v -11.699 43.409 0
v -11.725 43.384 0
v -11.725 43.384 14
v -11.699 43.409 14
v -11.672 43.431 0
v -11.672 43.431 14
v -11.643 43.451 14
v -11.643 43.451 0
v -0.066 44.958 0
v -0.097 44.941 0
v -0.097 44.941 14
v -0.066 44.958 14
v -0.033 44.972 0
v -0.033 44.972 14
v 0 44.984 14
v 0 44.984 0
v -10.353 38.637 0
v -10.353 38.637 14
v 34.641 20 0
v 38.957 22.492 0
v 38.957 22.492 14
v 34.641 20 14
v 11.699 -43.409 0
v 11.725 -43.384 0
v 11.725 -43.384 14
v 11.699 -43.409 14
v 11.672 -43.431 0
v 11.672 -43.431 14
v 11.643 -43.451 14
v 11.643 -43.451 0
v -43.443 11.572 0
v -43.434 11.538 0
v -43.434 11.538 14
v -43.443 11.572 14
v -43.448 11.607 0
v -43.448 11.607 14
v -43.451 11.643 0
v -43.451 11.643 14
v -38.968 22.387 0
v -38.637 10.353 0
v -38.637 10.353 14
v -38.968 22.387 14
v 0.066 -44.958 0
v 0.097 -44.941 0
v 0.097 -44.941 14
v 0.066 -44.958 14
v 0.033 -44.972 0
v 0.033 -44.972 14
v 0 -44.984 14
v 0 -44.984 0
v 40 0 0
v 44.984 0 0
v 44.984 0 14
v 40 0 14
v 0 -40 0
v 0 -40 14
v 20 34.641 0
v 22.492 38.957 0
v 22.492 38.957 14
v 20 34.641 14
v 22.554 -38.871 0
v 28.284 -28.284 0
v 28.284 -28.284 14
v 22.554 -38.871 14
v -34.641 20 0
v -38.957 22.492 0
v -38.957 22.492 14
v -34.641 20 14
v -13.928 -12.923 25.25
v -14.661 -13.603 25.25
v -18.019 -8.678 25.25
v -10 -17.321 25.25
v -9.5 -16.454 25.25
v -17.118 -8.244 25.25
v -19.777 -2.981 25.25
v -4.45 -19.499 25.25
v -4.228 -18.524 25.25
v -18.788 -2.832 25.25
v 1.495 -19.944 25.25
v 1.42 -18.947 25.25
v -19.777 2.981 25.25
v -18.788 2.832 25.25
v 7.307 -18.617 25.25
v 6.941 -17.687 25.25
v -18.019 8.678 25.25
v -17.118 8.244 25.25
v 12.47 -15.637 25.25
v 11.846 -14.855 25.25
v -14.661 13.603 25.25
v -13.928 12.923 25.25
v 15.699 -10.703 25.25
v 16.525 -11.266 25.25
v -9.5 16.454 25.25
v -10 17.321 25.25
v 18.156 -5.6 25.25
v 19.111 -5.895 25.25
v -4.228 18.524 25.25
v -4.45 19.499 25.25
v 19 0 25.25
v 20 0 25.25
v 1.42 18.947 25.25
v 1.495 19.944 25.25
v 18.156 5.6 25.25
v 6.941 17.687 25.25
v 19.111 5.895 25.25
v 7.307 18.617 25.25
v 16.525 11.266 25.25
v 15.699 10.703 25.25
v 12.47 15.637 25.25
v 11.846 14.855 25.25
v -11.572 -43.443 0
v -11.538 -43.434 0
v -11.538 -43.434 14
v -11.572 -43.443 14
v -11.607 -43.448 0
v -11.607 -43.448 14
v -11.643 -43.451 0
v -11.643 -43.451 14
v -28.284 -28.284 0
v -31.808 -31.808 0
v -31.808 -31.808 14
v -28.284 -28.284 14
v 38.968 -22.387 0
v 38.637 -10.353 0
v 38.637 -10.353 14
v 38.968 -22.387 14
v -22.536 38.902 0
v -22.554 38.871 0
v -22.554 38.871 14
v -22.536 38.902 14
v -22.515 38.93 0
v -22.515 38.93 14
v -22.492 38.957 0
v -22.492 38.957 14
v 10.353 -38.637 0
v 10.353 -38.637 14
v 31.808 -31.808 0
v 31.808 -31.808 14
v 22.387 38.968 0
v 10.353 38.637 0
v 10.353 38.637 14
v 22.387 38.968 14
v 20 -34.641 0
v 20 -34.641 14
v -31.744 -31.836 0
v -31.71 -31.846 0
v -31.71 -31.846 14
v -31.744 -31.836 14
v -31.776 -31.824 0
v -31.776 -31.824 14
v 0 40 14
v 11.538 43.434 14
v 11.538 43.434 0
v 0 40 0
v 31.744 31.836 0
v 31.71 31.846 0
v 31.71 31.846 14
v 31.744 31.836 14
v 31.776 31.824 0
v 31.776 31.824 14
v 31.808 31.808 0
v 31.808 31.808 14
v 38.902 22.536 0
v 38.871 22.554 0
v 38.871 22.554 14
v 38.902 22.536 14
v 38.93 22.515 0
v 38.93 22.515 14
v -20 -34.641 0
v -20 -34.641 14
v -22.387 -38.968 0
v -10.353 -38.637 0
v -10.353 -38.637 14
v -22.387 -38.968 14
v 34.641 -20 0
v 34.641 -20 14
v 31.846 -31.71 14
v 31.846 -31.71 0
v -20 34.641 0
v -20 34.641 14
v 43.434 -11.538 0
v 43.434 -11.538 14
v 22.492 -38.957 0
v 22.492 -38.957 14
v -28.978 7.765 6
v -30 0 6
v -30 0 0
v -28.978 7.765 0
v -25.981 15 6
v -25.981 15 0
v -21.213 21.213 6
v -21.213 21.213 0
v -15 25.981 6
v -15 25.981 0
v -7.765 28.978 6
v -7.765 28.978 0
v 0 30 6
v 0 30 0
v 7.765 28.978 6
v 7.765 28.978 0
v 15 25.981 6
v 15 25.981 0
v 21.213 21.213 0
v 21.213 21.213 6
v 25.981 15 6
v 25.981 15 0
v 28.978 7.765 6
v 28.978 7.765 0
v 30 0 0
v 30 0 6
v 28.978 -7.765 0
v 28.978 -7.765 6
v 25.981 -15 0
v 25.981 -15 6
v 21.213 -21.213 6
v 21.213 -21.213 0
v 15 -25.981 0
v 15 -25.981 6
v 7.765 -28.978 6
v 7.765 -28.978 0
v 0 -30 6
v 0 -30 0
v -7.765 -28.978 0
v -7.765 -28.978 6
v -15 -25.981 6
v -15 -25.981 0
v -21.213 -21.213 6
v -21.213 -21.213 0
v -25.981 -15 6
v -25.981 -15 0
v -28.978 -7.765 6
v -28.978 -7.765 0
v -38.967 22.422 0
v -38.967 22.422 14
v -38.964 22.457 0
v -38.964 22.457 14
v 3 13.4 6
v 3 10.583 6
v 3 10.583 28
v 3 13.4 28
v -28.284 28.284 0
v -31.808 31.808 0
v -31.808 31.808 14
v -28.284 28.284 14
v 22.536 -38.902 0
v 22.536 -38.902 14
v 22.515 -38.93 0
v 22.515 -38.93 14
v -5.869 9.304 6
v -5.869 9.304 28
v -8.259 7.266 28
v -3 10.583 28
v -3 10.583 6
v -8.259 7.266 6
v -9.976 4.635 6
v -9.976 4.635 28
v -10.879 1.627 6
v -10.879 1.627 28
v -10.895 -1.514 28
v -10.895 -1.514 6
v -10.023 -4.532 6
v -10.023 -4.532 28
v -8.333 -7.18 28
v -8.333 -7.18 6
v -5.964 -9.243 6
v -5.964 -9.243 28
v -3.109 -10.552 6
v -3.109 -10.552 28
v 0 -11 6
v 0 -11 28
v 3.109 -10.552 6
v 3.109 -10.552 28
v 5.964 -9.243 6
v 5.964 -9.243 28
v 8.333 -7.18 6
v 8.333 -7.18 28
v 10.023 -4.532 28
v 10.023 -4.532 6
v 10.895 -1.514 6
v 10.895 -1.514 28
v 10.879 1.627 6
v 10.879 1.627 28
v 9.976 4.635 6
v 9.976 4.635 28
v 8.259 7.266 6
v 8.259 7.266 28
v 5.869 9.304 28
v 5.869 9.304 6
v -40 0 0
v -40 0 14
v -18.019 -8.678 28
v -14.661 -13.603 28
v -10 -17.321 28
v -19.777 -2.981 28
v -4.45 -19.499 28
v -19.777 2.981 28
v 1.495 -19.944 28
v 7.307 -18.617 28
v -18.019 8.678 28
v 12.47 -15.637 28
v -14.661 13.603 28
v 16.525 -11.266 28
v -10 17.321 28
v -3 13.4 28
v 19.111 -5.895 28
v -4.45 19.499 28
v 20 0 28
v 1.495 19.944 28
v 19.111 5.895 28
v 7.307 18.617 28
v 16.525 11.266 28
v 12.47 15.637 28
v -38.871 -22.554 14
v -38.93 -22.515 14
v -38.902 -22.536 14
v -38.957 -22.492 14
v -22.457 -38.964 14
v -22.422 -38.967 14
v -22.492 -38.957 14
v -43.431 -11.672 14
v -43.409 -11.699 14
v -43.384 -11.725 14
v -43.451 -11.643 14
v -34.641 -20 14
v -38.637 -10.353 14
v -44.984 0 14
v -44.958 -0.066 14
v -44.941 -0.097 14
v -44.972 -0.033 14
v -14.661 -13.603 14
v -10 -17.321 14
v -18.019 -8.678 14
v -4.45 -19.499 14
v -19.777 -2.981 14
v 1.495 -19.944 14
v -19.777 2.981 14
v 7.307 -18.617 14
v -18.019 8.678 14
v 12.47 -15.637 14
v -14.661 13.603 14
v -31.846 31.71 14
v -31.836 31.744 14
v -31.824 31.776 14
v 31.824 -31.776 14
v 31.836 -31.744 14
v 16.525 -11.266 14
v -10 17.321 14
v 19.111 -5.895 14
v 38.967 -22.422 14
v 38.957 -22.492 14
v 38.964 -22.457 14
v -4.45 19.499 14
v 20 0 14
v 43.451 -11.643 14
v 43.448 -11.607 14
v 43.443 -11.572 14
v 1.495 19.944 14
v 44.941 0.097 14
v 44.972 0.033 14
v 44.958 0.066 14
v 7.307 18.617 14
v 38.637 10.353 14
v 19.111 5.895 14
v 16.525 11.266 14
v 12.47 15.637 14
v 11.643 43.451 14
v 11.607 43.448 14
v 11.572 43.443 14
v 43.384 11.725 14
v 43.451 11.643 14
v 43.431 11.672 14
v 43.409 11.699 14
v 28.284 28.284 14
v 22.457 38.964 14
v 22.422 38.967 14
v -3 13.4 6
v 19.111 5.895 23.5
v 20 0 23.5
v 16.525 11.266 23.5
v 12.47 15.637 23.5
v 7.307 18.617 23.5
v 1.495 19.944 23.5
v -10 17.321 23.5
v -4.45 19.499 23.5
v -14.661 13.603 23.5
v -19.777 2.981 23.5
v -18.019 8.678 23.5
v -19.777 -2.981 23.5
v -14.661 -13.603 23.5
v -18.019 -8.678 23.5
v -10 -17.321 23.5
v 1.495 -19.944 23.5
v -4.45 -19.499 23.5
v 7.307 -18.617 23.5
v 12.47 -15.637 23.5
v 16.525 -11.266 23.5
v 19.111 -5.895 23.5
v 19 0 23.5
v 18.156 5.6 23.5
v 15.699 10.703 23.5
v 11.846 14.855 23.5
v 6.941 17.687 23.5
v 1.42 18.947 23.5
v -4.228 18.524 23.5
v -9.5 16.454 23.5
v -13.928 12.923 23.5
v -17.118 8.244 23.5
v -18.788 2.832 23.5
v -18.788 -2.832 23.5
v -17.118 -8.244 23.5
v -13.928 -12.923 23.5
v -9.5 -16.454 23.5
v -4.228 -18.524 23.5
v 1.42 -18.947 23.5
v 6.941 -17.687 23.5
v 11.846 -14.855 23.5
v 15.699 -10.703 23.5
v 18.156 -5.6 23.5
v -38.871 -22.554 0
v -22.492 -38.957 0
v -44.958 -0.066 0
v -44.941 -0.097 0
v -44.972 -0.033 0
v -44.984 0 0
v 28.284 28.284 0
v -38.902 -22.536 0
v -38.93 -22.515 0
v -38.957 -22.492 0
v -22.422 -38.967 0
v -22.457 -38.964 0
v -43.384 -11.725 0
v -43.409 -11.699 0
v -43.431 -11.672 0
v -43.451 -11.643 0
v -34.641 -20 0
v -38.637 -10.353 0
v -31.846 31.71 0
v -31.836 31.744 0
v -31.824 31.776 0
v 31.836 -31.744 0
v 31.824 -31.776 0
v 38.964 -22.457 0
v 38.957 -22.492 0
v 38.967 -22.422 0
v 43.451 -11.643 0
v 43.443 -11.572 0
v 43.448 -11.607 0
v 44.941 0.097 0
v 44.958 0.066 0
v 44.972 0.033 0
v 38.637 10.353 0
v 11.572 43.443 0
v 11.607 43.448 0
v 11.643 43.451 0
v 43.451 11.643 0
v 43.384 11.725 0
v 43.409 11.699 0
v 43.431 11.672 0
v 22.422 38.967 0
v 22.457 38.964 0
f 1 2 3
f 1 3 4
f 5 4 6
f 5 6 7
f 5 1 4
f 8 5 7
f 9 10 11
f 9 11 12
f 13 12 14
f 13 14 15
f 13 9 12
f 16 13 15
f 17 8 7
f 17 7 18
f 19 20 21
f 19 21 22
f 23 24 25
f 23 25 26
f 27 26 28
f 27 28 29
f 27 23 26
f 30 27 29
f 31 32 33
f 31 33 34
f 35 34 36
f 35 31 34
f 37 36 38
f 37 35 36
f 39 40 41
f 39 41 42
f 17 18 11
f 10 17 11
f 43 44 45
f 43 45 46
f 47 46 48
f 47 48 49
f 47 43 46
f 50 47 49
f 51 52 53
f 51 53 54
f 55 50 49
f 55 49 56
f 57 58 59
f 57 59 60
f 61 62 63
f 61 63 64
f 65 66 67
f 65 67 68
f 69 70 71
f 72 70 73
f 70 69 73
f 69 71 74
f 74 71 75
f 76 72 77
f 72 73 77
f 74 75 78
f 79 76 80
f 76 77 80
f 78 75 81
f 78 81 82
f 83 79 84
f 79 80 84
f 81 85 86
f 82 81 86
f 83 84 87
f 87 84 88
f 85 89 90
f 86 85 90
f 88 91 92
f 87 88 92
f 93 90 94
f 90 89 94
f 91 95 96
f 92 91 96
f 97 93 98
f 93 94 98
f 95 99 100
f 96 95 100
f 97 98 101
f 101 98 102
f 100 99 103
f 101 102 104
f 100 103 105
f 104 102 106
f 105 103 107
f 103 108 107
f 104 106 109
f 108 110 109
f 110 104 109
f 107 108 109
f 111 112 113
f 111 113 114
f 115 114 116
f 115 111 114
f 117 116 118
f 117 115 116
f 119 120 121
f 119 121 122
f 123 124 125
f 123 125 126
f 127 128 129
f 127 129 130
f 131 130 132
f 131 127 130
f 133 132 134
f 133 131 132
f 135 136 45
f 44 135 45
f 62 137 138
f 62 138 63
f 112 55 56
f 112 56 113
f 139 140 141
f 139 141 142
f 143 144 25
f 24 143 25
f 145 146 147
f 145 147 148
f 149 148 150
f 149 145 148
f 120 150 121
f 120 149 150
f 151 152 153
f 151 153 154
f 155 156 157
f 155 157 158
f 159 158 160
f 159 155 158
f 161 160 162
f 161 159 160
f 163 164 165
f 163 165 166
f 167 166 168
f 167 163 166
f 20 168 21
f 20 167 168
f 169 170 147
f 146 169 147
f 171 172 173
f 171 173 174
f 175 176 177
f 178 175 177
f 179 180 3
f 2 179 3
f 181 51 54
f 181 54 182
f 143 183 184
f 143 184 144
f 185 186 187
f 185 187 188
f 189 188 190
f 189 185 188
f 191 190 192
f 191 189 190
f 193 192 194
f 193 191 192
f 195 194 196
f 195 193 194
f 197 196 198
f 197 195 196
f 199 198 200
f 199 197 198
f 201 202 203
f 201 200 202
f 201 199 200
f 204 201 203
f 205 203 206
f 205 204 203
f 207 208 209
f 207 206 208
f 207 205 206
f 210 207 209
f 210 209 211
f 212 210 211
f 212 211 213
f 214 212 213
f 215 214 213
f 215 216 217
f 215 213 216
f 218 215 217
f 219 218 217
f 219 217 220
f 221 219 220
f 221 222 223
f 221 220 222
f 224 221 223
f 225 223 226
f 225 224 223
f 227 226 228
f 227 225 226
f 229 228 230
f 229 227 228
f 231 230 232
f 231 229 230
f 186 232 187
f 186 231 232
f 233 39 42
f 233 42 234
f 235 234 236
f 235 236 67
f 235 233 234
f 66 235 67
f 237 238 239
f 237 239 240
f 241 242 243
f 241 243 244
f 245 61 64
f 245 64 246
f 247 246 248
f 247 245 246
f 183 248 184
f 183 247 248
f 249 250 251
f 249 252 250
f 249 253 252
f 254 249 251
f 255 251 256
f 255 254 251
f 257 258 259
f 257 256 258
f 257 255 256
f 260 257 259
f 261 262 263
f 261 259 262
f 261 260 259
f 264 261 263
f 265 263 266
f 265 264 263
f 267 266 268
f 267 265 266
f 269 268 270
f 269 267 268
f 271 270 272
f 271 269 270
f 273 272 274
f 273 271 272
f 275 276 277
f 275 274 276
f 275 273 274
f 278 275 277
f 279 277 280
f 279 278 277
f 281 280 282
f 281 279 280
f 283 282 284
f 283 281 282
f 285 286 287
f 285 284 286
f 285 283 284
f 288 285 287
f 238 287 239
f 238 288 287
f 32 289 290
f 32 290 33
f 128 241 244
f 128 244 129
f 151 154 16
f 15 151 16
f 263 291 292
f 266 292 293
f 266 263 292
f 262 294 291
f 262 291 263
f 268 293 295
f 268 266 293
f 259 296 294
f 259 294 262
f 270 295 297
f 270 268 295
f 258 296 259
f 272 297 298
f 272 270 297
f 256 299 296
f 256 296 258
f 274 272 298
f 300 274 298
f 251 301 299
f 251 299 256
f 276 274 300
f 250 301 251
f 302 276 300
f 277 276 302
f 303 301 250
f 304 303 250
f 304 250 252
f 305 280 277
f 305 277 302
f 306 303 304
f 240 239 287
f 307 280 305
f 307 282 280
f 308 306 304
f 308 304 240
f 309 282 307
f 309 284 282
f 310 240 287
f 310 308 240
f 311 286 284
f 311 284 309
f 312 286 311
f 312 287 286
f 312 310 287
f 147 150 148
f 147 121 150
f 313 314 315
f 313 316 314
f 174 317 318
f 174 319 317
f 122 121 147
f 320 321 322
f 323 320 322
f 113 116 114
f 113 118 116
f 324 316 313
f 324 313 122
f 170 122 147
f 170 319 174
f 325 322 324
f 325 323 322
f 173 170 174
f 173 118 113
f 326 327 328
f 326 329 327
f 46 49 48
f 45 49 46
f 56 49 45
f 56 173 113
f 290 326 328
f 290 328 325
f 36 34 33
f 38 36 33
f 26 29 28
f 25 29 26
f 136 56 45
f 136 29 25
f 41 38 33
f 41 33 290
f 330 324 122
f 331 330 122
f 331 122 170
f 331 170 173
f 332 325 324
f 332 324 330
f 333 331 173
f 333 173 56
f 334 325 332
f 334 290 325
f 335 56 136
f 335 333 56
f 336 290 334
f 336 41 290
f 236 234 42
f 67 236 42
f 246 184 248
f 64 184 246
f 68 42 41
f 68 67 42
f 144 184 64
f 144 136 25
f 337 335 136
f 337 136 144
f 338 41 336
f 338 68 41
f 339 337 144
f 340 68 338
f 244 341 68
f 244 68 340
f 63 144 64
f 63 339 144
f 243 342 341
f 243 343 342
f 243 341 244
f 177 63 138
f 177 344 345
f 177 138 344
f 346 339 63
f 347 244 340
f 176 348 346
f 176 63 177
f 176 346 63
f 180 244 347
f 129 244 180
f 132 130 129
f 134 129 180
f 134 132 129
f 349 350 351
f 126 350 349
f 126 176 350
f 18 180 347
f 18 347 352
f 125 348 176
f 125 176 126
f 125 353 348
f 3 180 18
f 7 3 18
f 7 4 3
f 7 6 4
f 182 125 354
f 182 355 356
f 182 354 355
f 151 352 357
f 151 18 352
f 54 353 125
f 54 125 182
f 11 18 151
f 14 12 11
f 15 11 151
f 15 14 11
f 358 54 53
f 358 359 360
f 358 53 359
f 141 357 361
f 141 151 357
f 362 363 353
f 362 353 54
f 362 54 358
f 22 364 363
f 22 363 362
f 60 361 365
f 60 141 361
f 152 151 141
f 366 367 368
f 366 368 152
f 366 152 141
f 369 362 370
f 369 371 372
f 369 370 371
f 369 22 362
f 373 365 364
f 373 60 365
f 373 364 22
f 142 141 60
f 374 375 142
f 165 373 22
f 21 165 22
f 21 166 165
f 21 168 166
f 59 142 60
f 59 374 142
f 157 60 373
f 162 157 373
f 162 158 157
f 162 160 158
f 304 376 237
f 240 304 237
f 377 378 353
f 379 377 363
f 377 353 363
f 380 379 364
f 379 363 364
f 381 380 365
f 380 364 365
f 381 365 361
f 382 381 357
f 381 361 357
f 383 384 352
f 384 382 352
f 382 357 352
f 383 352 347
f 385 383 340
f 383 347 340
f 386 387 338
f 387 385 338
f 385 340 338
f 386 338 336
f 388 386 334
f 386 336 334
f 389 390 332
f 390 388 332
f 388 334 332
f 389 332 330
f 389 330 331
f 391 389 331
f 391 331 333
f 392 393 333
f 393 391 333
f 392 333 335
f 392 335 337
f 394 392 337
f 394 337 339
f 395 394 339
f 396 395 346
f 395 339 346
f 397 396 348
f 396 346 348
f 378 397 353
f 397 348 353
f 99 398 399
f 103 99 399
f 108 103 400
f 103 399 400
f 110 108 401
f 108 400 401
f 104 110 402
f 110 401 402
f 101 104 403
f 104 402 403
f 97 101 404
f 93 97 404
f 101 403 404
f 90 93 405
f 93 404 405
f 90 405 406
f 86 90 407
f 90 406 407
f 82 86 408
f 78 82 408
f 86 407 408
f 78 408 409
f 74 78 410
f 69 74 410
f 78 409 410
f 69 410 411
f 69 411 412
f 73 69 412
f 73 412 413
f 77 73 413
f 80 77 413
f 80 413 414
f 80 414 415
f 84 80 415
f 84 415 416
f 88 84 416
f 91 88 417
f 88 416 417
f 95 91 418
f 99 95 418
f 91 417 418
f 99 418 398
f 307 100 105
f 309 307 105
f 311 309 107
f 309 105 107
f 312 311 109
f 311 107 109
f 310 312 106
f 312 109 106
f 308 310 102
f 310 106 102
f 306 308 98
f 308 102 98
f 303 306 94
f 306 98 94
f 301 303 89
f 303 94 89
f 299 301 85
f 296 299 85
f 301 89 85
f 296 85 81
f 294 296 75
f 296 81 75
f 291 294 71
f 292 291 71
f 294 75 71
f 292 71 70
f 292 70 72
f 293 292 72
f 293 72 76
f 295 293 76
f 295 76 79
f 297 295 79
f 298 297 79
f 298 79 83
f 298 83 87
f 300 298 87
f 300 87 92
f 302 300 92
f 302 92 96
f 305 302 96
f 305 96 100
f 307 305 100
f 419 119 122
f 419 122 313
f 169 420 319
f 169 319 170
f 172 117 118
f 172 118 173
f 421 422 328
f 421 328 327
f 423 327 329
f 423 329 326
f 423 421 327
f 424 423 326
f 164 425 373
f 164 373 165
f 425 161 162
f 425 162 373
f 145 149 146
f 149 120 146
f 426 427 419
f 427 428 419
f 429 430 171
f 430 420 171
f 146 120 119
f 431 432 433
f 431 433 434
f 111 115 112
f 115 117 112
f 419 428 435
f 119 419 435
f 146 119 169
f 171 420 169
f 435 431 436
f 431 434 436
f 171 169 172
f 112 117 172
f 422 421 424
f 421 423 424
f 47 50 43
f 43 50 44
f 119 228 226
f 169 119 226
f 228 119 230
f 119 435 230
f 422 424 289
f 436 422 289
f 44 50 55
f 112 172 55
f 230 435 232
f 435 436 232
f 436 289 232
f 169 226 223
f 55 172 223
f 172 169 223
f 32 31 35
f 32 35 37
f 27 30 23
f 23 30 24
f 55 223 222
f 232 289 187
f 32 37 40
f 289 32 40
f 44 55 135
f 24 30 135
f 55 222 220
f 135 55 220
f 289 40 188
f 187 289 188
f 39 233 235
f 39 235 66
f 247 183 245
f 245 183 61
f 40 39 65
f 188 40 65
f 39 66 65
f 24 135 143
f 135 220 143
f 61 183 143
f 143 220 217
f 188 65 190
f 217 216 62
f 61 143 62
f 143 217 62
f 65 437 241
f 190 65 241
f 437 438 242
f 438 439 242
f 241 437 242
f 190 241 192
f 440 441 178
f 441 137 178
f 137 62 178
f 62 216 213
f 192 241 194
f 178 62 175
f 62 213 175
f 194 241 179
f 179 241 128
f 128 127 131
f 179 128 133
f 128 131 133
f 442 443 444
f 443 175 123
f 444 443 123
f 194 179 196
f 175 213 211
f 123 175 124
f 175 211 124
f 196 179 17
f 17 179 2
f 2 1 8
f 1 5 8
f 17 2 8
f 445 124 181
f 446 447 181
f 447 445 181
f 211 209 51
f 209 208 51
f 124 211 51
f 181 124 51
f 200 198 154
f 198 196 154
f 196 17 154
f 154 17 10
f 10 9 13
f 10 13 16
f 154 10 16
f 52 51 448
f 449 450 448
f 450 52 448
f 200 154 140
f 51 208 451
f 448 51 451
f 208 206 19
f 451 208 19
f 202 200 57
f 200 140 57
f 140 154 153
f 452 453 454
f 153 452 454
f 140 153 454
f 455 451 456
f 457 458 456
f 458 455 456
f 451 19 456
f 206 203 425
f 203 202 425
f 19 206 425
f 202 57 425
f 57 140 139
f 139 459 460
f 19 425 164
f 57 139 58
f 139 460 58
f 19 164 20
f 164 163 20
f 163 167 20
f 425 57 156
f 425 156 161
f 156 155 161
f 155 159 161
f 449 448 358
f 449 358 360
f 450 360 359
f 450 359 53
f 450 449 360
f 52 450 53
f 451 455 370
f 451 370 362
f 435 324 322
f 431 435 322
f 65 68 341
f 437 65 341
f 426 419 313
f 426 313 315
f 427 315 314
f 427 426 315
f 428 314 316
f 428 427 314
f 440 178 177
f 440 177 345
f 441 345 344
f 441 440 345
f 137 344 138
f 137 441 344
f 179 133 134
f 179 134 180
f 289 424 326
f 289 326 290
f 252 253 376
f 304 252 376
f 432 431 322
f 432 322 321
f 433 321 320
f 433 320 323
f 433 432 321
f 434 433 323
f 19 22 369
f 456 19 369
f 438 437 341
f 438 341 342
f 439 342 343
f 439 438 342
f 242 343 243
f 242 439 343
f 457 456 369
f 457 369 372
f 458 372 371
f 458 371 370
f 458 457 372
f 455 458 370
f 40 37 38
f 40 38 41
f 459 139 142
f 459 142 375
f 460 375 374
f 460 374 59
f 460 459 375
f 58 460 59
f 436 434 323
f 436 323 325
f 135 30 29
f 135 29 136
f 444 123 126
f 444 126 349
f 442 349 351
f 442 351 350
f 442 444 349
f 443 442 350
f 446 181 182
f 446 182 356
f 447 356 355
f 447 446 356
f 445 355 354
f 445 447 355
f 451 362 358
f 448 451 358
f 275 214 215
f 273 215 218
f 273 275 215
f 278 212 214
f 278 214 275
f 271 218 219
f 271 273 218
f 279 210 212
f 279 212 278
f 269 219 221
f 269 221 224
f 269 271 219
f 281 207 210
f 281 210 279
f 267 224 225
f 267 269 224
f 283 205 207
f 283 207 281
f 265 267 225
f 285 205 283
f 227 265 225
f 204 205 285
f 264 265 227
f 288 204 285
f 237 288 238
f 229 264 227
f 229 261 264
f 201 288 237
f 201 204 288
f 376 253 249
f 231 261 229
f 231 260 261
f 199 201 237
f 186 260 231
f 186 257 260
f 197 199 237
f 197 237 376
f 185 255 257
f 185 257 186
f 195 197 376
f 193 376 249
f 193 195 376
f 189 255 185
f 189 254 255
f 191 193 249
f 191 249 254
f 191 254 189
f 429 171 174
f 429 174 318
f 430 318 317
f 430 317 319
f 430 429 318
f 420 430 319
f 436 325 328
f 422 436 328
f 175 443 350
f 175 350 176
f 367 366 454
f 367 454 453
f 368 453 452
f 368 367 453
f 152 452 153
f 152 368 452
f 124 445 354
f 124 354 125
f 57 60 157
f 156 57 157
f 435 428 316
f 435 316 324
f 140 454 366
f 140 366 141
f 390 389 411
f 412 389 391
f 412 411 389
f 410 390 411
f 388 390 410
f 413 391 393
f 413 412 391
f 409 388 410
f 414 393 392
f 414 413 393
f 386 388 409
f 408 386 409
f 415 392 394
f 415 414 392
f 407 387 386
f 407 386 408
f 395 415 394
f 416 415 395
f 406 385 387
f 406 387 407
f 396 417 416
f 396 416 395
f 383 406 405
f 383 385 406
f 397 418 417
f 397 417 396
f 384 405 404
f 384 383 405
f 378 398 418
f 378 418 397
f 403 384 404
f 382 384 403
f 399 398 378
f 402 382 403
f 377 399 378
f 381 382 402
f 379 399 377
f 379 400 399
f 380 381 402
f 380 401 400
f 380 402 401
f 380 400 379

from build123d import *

# Parameters (mm, degrees)
SKETCH1_R                  = 45
BOSS_EXTRUDE1_DEPTH        = 14
SKETCH2_R                  = 20
BOSS_EXTRUDE2_DEPTH        = 14
CUT_EXTRUDE1_DEPTH         = 70.526973183
CUT_EXTRUDE1_DEPTH_BACK    = 70.526973183
SKETCH3_R                  = 11
CUT_EXTRUDE2_DEPTH         = 70.526973183
CUT_EXTRUDE2_DEPTH_BACK    = 6
SKETCH4_R                  = 30
CUT_EXTRUDE3_DEPTH         = 70.526973183
CUT_EXTRUDE3_DEPTH_BACK    = 70.526973183
SKETCH5_W                  = 6
SKETCH5_H                  = 4.8
CUT_EXTRUDE4_DEPTH         = 70.526973183
FILLET1_R                  = 0.4
CIRPATTERN1_DEPTH          = 14
CUT_J8_CIRCLIPGROOVE_START = 23.5
SKETCH_J8_GROOVE_R         = 21.5
SKETCH_J8_GROOVE_R_2       = 19
CUT_J8_CIRCLIPGROOVE_DEPTH = 1.75


# Read off the part's stored shape, not the designer's step: CirPattern1
with BuildPart() as part:
    # Sketch1 → Boss-Extrude1 (new body)
    with BuildSketch(Plane.XY):
        Circle(SKETCH1_R)
    extrude(amount=BOSS_EXTRUDE1_DEPTH)

    # Sketch2 → Boss-Extrude2 (add)
    with BuildSketch(Plane.XY.offset(14)):
        Circle(SKETCH2_R)
    extrude(amount=BOSS_EXTRUDE2_DEPTH)

    # Sketch3 → Cut-Extrude1 (cut, two sides: drawn at the far end of the back side and taken through both)
    with BuildSketch(Plane.XY.offset(28).offset(-CUT_EXTRUDE1_DEPTH_BACK)):
        Circle(SKETCH3_R)
    extrude(amount=CUT_EXTRUDE1_DEPTH + CUT_EXTRUDE1_DEPTH_BACK, mode=Mode.SUBTRACT)

    # Sketch4 → Cut-Extrude2 (cut, two sides: drawn at the far end of the back side and taken through both)
    with BuildSketch(Plane(origin=(0, 0, 0), x_dir=(-1, 0, 0), z_dir=(0, 0, -1)).offset(-CUT_EXTRUDE2_DEPTH_BACK)):
        Circle(SKETCH4_R)
    extrude(amount=CUT_EXTRUDE2_DEPTH + CUT_EXTRUDE2_DEPTH_BACK, mode=Mode.SUBTRACT)

    # Sketch5 → Cut-Extrude3 (cut, two sides: drawn at the far end of the back side and taken through both)
    with BuildSketch(Plane.XY.offset(28).offset(-CUT_EXTRUDE3_DEPTH_BACK)):
        with Locations((0, 11)):
            Rectangle(SKETCH5_W, SKETCH5_H)
    extrude(amount=CUT_EXTRUDE3_DEPTH + CUT_EXTRUDE3_DEPTH_BACK, mode=Mode.SUBTRACT)

    # Sketch6 → Cut-Extrude4 (cut, symmetric)
    with BuildSketch(Plane(origin=(0, 0, 0), x_dir=(-1, 0, 0), z_dir=(0, 0, -1))):
        with BuildLine():
            Line((0, 40), (0, 45))
            ThreePointArc((0, 45), (-5.87367865, 44.615018762), (-11.64685703, 43.466662183))
            Line((-11.64685703, 43.466662183), (0, 40))
        make_face()
    extrude(amount=CUT_EXTRUDE4_DEPTH, both=True, mode=Mode.SUBTRACT)

    # Fillet1
    fillet1_edges = [part.edges().sort_by_distance(p)[0] for p in [
        (11.64685703, 43.466662183, 7),
    ]]
    fillet(fillet1_edges, radius=FILLET1_R)

    # CirPattern1 outline → CirPattern1 (cut)
    with BuildSketch(Plane.XY):
        with BuildLine():
            Line((10.352761804, 38.637033052), (22.386673811, 38.96802613))
            ThreePointArc((22.386673811, 38.96802613), (22.43960565, 38.965973203), (22.491802074, 38.956943945))
            Line((22.491802074, 38.956943945), (20, 34.641016151))
            Line((20, 34.641016151), (31.709533711, 31.8461253))
            ThreePointArc((31.709533711, 31.8461253), (31.760130605, 31.830442556), (31.808211535, 31.808211535))
            Line((31.808211535, 31.808211535), (28.284271247, 28.284271247))
            Line((28.284271247, 28.284271247), (38.871441292, 22.553963659))
            ThreePointArc((38.871441292, 22.553963659), (38.916255145, 22.525719852), (38.956943945, 22.491802074))
            Line((38.956943945, 22.491802074), (34.641016151, 20))
            Line((34.641016151, 20), (43.384324386, 11.724786666))
            ThreePointArc((43.384324386, 11.724786666), (43.42030121, 11.685906565), (43.450825005, 11.642613471))
            Line((43.450825005, 11.642613471), (38.637033052, 10.352761804))
            Line((38.637033052, 10.352761804), (44.94063747, 0.096584839))
            ThreePointArc((44.94063747, 0.096584839), (44.965325502, 0.049718058), (44.983604147, 0))
            Line((44.983604147, 0), (40, 0))
            Line((40, 0), (43.434320378, -11.538199086))
            ThreePointArc((43.434320378, -11.538199086), (43.44603717, -11.589858654), (43.450825005, -11.642613471))
            Line((43.450825005, -11.642613471), (38.637033052, -10.352761804))
            Line((38.637033052, -10.352761804), (38.96802613, -22.386673811))
            ThreePointArc((38.96802613, -22.386673811), (38.965973203, -22.43960565), (38.956943945, -22.491802074))
            Line((38.956943945, -22.491802074), (34.641016151, -20))
            Line((34.641016151, -20), (31.8461253, -31.709533711))
            ThreePointArc((31.8461253, -31.709533711), (31.830442556, -31.760130605), (31.808211535, -31.808211535))
            Line((31.808211535, -31.808211535), (28.284271247, -28.284271247))
            Line((28.284271247, -28.284271247), (22.553963659, -38.871441292))
            ThreePointArc((22.553963659, -38.871441292), (22.525719852, -38.916255145), (22.491802074, -38.956943945))
            Line((22.491802074, -38.956943945), (20, -34.641016151))
            Line((20, -34.641016151), (11.724786666, -43.384324386))
            ThreePointArc((11.724786666, -43.384324386), (11.685906565, -43.42030121), (11.642613471, -43.450825005))
            Line((11.642613471, -43.450825005), (10.352761804, -38.637033052))
            Line((10.352761804, -38.637033052), (0.096584839, -44.94063747))
            ThreePointArc((0.096584839, -44.94063747), (0.049718058, -44.965325502), (0, -44.983604147))
            Line((0, -44.983604147), (0, -40))
            Line((0, -40), (-11.538199086, -43.434320378))
            ThreePointArc((-11.538199086, -43.434320378), (-11.589858654, -43.44603717), (-11.642613471, -43.450825005))
            Line((-11.642613471, -43.450825005), (-10.352761804, -38.637033052))
            Line((-10.352761804, -38.637033052), (-22.386673811, -38.96802613))
            ThreePointArc((-22.386673811, -38.96802613), (-22.43960565, -38.965973203), (-22.491802074, -38.956943945))
            Line((-22.491802074, -38.956943945), (-20, -34.641016151))
            Line((-20, -34.641016151), (-31.709533711, -31.8461253))
            ThreePointArc((-31.709533711, -31.8461253), (-31.760130605, -31.830442556), (-31.808211535, -31.808211535))
            Line((-31.808211535, -31.808211535), (-28.284271247, -28.284271247))
            Line((-28.284271247, -28.284271247), (-38.871441292, -22.553963659))
            ThreePointArc((-38.871441292, -22.553963659), (-38.916255145, -22.525719852), (-38.956943945, -22.491802074))
            Line((-38.956943945, -22.491802074), (-34.641016151, -20))
            Line((-34.641016151, -20), (-43.384324386, -11.724786666))
            ThreePointArc((-43.384324386, -11.724786666), (-43.42030121, -11.685906565), (-43.450825005, -11.642613471))
            Line((-43.450825005, -11.642613471), (-38.637033052, -10.352761804))
            Line((-38.637033052, -10.352761804), (-44.94063747, -0.096584839))
            ThreePointArc((-44.94063747, -0.096584839), (-44.965325502, -0.049718058), (-44.983604147, 0))
            Line((-44.983604147, 0), (-40, 0))
            Line((-40, 0), (-43.434320378, 11.538199086))
            ThreePointArc((-43.434320378, 11.538199086), (-43.44603717, 11.589858654), (-43.450825005, 11.642613471))
            Line((-43.450825005, 11.642613471), (-38.637033052, 10.352761804))
            Line((-38.637033052, 10.352761804), (-38.96802613, 22.386673811))
            ThreePointArc((-38.96802613, 22.386673811), (-38.965973203, 22.43960565), (-38.956943945, 22.491802074))
            Line((-38.956943945, 22.491802074), (-34.641016151, 20))
            Line((-34.641016151, 20), (-31.8461253, 31.709533711))
            ThreePointArc((-31.8461253, 31.709533711), (-31.830442556, 31.760130605), (-31.808211535, 31.808211535))
            Line((-31.808211535, 31.808211535), (-28.284271247, 28.284271247))
            Line((-28.284271247, 28.284271247), (-22.553963659, 38.871441292))
            ThreePointArc((-22.553963659, 38.871441292), (-22.525719852, 38.916255145), (-22.491802074, 38.956943945))
            Line((-22.491802074, 38.956943945), (-20, 34.641016151))
            Line((-20, 34.641016151), (-11.724786666, 43.384324386))
            ThreePointArc((-11.724786666, 43.384324386), (-11.685906565, 43.42030121), (-11.642613471, 43.450825005))
            Line((-11.642613471, 43.450825005), (-10.352761804, 38.637033052))
            Line((-10.352761804, 38.637033052), (-0.096584839, 44.94063747))
            ThreePointArc((-0.096584839, 44.94063747), (-0.049718058, 44.965325502), (0, 44.983604147))
            Line((0, 44.983604147), (0, 45))
            ThreePointArc((0, 45), (-5.930124979, -44.607551129), (11.756815703, 43.437049676))
            ThreePointArc((11.756815703, 43.437049676), (11.700212353, 43.448063996), (11.642613471, 43.450825005))
            Line((11.642613471, 43.450825005), (10.352761804, 38.637033052))
        make_face()
    extrude(amount=CIRPATTERN1_DEPTH, mode=Mode.SUBTRACT)

    # Sketch_J8_Groove → Cut_J8_CirclipGroove (cut)
    with BuildSketch(Plane.XY.offset(CUT_J8_CIRCLIPGROOVE_START)):
        Circle(SKETCH_J8_GROOVE_R)
        Circle(SKETCH_J8_GROOVE_R_2, mode=Mode.SUBTRACT)
    extrude(amount=CUT_J8_CIRCLIPGROOVE_DEPTH, mode=Mode.SUBTRACT)


solid = part.part
